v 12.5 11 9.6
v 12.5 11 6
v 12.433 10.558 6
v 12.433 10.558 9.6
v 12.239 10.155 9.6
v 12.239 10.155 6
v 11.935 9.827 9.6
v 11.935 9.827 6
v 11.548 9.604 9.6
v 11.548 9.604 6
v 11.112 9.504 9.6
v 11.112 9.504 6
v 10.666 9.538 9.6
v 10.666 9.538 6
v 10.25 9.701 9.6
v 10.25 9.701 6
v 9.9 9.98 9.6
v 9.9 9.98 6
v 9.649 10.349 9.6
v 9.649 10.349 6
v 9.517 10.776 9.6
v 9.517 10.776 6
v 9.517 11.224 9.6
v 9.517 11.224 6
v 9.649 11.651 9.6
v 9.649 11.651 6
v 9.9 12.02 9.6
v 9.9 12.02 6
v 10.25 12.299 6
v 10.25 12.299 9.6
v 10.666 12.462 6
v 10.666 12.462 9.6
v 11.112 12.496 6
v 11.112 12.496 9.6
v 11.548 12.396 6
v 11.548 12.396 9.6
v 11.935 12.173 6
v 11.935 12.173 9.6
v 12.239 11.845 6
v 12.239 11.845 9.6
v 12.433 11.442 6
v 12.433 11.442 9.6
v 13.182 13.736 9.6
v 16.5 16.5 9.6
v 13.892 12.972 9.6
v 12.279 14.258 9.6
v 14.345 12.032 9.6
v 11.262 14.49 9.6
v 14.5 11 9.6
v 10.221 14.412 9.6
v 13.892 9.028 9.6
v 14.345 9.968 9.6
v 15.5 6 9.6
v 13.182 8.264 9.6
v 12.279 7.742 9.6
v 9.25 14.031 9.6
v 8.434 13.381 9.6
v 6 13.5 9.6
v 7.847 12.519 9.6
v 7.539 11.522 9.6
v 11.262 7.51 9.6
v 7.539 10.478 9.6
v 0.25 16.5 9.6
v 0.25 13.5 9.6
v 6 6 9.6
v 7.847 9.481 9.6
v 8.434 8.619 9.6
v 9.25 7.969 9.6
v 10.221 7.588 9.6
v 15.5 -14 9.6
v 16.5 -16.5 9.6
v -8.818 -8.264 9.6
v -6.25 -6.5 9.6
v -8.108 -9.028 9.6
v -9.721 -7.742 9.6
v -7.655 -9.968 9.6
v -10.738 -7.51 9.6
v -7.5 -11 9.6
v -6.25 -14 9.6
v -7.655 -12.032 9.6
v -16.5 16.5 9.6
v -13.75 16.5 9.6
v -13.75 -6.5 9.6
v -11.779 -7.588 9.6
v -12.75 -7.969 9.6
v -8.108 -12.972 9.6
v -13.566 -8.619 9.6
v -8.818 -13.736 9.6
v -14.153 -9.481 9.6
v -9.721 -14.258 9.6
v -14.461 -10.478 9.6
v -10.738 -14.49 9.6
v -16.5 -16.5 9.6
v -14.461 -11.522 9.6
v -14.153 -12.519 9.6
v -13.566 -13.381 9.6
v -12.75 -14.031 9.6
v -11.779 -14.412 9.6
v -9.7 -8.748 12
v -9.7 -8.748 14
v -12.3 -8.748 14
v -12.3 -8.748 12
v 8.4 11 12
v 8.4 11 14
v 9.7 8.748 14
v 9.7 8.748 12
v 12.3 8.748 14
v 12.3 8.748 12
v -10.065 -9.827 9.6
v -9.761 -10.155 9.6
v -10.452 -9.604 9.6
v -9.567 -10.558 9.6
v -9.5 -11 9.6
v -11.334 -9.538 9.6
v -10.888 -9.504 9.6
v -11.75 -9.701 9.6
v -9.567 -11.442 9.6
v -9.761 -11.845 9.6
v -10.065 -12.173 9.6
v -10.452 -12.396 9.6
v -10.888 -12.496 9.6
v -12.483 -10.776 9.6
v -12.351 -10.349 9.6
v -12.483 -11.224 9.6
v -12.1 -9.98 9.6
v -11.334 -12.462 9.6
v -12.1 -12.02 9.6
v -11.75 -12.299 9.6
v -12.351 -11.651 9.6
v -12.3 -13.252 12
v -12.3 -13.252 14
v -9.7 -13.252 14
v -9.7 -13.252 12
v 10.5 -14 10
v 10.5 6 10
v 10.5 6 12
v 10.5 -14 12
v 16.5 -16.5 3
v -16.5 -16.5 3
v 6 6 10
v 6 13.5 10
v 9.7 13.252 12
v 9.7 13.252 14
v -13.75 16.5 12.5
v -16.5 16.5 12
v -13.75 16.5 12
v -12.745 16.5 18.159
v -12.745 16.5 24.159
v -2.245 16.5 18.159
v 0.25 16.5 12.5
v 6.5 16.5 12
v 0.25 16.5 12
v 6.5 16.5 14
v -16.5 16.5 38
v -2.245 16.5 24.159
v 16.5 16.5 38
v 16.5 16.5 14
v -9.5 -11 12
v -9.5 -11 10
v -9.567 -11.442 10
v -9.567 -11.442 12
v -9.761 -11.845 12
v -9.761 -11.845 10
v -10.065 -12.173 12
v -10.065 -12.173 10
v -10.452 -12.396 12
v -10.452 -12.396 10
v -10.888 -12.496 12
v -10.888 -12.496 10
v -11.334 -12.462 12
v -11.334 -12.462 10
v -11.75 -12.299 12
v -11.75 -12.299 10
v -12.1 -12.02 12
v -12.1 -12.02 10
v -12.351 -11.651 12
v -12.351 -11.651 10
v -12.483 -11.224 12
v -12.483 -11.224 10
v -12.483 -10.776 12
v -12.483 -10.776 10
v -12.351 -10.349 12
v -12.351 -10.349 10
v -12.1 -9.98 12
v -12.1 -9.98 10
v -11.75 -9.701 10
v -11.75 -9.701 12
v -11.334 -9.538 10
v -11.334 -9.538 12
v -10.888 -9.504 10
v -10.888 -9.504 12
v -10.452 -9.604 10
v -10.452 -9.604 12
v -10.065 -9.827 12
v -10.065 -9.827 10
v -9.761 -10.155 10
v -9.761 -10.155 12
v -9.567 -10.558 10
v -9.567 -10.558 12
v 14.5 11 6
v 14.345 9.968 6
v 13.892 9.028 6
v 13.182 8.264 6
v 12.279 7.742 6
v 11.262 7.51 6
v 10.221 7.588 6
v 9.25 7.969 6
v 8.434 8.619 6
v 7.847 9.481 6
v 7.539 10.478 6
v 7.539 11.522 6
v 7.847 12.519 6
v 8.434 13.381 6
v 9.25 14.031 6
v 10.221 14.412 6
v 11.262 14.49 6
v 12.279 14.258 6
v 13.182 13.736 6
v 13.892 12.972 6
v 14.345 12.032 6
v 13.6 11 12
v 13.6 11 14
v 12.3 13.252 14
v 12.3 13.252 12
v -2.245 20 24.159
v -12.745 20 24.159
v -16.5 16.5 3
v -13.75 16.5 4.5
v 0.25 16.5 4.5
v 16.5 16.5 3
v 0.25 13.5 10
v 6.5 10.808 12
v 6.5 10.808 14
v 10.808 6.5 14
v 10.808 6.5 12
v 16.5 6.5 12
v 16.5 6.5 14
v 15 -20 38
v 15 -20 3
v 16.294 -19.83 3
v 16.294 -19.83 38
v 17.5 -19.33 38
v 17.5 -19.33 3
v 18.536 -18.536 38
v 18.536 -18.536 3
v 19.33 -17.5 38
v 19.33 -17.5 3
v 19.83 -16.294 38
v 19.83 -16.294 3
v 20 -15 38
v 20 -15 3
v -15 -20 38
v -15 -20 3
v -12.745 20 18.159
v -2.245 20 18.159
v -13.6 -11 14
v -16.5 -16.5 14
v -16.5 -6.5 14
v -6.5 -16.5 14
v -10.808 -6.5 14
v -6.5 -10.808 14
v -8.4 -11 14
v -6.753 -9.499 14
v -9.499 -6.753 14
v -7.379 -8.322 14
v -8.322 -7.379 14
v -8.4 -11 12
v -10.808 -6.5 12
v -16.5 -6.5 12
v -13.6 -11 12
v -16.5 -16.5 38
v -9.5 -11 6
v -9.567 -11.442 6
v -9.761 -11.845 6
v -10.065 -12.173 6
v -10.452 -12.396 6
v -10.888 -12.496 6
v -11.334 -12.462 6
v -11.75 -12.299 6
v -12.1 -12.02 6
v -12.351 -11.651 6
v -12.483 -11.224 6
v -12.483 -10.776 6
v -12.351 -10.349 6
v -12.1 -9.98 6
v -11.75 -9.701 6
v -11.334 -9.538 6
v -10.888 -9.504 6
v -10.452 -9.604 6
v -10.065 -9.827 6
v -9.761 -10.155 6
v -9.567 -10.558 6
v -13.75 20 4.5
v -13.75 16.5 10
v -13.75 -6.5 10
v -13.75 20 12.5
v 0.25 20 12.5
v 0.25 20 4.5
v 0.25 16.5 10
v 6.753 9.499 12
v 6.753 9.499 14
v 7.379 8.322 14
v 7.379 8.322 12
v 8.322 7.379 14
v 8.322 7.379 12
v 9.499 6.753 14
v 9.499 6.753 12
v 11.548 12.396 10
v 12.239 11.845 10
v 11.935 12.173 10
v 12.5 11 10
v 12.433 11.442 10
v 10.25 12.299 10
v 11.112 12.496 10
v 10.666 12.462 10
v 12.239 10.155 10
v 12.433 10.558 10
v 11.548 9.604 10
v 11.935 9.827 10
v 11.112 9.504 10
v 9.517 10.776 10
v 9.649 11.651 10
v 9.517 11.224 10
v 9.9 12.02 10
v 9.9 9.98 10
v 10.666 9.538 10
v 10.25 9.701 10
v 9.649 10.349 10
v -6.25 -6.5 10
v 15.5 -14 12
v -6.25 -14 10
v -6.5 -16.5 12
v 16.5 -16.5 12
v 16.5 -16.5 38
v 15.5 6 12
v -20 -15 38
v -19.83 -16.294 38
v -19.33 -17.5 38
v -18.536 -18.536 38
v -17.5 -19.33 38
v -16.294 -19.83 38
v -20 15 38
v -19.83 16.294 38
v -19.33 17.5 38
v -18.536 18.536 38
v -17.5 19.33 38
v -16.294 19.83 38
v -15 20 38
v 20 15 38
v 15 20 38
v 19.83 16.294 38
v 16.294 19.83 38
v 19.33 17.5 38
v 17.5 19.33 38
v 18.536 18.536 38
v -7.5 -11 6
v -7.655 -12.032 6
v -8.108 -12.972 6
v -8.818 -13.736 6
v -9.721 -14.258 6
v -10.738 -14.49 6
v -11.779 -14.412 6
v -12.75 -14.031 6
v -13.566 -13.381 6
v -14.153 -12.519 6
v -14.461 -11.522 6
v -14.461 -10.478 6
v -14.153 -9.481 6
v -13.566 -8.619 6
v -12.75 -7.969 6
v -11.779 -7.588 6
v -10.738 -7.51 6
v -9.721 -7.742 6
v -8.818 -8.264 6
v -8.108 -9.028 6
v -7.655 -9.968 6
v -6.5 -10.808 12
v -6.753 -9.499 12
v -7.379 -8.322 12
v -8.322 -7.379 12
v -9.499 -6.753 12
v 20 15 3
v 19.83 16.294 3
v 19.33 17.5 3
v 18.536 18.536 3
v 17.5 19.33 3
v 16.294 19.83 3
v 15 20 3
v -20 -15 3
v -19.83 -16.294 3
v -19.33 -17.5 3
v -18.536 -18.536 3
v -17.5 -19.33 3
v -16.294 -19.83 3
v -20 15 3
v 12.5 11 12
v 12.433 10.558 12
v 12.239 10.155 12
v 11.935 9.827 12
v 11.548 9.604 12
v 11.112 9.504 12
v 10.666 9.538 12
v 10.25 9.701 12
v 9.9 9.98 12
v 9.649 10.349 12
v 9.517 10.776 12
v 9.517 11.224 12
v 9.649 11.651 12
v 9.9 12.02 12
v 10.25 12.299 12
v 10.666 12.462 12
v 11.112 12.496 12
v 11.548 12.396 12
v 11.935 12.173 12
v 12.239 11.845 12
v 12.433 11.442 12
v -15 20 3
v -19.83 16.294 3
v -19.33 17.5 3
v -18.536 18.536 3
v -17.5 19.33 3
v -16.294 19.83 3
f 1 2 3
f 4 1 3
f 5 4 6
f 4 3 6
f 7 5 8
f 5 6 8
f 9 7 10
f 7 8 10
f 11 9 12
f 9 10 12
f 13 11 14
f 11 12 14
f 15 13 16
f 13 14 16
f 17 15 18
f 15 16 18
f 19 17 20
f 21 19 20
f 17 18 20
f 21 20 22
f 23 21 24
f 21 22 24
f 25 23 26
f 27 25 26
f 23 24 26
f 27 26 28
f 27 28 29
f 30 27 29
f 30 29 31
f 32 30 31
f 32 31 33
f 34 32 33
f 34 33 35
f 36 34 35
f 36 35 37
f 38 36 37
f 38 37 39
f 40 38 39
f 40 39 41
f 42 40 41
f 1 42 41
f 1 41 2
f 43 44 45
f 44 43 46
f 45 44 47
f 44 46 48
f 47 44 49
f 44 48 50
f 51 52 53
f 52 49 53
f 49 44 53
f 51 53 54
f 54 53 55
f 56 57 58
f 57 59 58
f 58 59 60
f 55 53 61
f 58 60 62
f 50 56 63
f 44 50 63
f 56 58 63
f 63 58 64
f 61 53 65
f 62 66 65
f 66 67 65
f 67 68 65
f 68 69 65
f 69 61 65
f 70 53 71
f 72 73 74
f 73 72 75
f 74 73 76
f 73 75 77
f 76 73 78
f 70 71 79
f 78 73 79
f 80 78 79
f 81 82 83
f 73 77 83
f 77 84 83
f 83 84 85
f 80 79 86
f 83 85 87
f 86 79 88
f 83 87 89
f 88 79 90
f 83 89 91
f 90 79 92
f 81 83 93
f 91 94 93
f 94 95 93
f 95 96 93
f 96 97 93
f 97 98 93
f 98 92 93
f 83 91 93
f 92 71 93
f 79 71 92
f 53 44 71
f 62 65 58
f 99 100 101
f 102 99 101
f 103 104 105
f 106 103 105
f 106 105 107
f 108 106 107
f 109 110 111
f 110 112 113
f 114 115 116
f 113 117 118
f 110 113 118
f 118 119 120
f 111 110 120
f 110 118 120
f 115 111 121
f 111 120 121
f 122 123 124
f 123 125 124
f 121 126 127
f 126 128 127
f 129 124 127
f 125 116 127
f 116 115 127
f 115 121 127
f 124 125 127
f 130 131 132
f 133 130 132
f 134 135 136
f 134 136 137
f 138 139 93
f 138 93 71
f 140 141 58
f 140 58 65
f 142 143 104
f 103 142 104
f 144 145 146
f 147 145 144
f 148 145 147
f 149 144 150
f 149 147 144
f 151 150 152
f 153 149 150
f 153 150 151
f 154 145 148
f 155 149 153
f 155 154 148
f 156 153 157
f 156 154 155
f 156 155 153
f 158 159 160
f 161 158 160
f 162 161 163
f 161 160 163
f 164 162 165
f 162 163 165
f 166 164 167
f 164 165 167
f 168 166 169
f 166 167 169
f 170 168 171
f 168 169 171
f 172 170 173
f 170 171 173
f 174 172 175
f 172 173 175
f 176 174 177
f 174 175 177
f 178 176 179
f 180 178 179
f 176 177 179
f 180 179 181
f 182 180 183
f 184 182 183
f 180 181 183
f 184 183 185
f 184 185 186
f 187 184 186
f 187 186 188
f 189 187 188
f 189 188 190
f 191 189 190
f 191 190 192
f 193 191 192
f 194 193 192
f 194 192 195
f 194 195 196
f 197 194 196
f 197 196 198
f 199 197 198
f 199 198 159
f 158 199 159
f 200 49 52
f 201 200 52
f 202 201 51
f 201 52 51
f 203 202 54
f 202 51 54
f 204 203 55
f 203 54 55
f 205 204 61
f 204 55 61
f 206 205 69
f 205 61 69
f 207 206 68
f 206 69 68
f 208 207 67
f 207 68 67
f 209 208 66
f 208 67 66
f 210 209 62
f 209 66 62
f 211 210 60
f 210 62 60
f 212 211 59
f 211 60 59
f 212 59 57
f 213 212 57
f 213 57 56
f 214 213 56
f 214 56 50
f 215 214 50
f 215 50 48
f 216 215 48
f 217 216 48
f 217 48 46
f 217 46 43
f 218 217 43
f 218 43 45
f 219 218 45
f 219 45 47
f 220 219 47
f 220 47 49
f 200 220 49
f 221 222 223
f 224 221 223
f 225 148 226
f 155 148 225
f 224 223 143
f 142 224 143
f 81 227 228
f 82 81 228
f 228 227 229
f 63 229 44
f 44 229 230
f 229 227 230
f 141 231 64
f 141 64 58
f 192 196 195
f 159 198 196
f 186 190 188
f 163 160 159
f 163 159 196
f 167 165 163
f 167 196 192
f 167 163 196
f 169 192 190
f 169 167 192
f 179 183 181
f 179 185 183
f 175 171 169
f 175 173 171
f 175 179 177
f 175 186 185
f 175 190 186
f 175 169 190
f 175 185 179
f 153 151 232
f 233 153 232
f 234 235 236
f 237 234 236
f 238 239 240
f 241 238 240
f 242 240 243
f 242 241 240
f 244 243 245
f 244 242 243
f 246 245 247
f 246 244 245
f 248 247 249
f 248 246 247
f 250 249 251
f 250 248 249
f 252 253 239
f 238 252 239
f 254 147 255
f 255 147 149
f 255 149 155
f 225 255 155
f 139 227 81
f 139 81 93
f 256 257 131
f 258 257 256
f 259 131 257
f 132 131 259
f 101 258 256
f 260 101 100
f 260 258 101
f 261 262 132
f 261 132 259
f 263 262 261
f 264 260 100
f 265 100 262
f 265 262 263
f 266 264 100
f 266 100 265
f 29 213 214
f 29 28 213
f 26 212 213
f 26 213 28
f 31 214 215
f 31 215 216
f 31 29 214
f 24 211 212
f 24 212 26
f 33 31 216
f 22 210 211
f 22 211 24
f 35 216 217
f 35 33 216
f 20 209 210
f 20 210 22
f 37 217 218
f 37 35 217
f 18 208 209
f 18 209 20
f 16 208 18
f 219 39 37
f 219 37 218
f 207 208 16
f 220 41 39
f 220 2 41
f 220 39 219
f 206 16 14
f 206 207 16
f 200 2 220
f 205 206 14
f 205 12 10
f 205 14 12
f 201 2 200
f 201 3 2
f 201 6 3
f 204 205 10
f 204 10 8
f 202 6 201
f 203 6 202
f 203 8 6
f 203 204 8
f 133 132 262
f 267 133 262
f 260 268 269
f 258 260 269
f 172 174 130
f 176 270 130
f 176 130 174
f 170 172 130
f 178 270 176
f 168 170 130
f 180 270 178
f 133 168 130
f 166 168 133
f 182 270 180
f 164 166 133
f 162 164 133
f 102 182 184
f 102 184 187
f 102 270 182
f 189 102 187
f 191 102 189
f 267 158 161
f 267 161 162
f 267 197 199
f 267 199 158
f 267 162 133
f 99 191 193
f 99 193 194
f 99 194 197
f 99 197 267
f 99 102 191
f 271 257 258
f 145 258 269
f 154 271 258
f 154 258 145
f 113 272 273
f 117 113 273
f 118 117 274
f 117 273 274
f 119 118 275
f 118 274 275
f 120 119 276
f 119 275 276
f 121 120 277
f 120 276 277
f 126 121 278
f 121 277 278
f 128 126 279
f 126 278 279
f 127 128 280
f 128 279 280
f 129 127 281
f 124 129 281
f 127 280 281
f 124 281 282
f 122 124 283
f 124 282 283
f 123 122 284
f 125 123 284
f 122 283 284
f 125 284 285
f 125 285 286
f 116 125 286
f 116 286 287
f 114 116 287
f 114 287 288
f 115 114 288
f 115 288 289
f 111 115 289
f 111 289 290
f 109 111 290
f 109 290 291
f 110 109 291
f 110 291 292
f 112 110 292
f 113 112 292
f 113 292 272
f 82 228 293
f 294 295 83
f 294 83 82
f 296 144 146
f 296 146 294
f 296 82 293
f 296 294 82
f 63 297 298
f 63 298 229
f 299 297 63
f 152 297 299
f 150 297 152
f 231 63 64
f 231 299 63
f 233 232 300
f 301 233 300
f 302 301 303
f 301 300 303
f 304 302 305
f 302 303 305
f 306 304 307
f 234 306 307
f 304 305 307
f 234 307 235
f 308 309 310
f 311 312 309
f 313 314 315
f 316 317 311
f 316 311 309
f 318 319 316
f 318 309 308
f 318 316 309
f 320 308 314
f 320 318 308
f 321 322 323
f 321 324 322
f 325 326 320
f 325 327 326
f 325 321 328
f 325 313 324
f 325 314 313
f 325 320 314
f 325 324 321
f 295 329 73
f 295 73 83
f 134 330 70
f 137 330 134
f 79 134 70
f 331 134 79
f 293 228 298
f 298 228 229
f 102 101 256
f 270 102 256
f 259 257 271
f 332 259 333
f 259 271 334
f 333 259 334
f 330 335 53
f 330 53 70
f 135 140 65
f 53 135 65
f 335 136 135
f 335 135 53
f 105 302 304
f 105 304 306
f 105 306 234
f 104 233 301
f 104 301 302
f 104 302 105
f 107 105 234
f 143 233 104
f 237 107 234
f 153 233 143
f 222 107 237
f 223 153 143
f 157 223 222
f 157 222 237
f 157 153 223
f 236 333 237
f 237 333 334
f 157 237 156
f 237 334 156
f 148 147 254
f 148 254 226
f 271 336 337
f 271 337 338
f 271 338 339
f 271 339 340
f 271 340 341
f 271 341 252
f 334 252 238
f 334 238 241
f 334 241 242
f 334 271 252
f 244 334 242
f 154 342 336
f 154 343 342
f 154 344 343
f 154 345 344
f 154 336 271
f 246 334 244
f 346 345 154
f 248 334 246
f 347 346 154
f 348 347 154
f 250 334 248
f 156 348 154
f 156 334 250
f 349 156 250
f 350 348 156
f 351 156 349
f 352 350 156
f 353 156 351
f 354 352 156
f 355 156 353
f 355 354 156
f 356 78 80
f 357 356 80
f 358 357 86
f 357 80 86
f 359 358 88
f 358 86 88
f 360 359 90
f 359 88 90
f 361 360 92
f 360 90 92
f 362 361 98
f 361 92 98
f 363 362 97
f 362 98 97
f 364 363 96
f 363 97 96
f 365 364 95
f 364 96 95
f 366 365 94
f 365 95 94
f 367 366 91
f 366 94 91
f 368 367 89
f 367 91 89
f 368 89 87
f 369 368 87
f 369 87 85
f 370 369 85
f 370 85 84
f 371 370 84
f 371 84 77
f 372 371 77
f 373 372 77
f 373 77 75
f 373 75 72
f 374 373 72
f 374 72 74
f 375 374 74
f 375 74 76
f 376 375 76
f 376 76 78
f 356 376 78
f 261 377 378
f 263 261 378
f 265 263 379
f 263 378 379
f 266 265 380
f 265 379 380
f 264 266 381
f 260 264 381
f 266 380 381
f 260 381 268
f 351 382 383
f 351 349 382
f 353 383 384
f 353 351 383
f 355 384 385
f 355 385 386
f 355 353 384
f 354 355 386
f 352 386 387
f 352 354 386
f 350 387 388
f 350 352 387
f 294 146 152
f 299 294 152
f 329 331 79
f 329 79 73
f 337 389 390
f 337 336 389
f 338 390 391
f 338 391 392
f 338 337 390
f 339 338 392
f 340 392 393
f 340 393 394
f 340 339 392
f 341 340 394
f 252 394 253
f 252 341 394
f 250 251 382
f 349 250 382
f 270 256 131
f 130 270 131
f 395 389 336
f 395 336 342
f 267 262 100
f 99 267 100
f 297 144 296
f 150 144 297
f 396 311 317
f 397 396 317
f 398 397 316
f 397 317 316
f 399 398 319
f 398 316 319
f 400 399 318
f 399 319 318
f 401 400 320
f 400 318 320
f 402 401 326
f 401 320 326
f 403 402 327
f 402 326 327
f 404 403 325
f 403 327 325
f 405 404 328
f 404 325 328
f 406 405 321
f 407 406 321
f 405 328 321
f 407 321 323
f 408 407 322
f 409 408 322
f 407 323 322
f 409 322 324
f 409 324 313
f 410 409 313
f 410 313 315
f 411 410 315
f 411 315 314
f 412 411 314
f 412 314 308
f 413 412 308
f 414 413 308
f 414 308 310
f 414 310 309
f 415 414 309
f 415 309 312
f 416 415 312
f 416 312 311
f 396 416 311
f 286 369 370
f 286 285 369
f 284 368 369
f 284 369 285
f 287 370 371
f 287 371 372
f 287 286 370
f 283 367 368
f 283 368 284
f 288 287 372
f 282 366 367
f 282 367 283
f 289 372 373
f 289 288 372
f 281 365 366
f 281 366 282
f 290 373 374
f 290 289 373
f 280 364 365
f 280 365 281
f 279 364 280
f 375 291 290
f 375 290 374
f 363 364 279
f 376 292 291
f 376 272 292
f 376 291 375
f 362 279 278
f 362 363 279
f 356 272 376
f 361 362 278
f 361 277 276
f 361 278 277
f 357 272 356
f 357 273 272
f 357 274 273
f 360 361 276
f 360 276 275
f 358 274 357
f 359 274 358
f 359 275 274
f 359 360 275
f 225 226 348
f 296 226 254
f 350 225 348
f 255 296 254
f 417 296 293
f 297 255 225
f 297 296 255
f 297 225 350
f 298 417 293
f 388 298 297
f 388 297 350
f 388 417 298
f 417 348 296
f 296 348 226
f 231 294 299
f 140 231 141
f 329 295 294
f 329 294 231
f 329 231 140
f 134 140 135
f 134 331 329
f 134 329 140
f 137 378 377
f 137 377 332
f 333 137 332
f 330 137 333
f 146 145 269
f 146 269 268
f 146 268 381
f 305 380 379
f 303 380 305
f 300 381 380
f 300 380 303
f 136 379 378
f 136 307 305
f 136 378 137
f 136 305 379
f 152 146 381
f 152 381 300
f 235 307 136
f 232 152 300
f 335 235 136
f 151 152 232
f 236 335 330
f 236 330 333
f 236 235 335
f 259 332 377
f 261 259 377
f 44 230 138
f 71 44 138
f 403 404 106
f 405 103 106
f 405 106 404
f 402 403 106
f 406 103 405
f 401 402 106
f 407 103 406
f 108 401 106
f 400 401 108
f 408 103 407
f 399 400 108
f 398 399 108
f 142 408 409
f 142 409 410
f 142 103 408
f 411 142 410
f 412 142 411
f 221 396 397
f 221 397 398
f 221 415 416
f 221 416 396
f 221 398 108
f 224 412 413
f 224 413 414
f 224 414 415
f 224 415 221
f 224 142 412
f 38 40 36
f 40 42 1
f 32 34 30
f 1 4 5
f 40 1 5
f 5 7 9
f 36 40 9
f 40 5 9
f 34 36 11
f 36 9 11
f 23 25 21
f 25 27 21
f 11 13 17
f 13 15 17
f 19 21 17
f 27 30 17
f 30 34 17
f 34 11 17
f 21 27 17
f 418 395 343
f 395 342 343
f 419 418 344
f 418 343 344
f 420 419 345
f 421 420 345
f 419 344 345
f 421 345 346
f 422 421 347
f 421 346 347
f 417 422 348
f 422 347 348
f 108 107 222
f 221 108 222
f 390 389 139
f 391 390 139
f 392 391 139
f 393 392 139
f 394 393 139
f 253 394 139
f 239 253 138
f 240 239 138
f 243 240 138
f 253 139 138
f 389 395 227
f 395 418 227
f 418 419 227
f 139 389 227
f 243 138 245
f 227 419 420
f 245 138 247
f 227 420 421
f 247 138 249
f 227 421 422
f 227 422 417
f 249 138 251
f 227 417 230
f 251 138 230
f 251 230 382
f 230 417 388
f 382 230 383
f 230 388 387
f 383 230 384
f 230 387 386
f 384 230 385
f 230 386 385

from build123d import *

# Parameters (mm, degrees)
SKETCH004_W     = 40
SKETCH004_H     = 40
PAD001_DEPTH    = 35
FILLET001_R     = 5
SKETCH005_W     = 33
SKETCH005_H     = 33
POCKET003_DEPTH = 7
SKETCH006_W     = 5
SKETCH006_H     = 20
POCKET004_DEPTH = 2
SKETCH007_R     = 3.5
PAD002_DEPTH    = 4
SKETCH009_W     = 33
SKETCH009_H     = 33
POCKET006_DEPTH = 31
SKETCH010_W     = 14
SKETCH010_H     = 8
POCKET007_DEPTH = 4
SKETCH011_W     = 10.5
SKETCH011_H     = 6
POCKET008_DEPTH = 4
PAD003_DEPTH    = 2
SKETCH013_R     = 1.5
POCKET009_DEPTH = 8
POCKET010_DEPTH = 2
PAD004_DEPTH    = 0.4


with BuildPart() as part:
    # Sketch004 → Pad001 (new body)
    with BuildSketch(Plane.XY):
        Rectangle(SKETCH004_W, SKETCH004_H)
    extrude(amount=PAD001_DEPTH)

    # Fillet001
    fillet001_edges = [part.edges().sort_by_distance(p)[0] for p in [
        (-20, -20, 17.5),
        (20, -20, 17.5),
        (20, 20, 17.5),
        (-20, 20, 17.5),
    ]]
    fillet(fillet001_edges, radius=FILLET001_R)

    # Sketch005 (on Face2 of Fillet001) → Pocket003 (cut)
    with BuildSketch(Plane(origin=(0, 0, 0), x_dir=(1, 0, 0), z_dir=(0, 0, -1))):
        Rectangle(SKETCH005_W, SKETCH005_H)
    extrude(amount=-POCKET003_DEPTH, mode=Mode.SUBTRACT)

    # Sketch006 (on Face15 of Pocket003) → Pocket004 (cut)
    with BuildSketch(Plane(origin=(0, 0, 7), x_dir=(1, 0, 0), z_dir=(0, 0, -1))):
        with Locations((13, 4)):
            Rectangle(SKETCH006_W, SKETCH006_H)
    extrude(amount=-POCKET004_DEPTH, mode=Mode.SUBTRACT)

    # Sketch007 (on Face15 of Pocket004) → Pad002 (join)
    with BuildSketch(Plane(origin=(0, 0, 7), x_dir=(1, 0, 0), z_dir=(0, 0, -1))):
        with Locations((-11, 11)):
            Circle(SKETCH007_R)
        with Locations((11, -11)):
            Circle(SKETCH007_R)
    extrude(amount=PAD002_DEPTH)

    # Sketch009 → Pocket006 (cut)
    with BuildSketch(Plane.XY.offset(40)):
        Rectangle(SKETCH009_W, SKETCH009_H)
    extrude(amount=-POCKET006_DEPTH, mode=Mode.SUBTRACT)

    # Sketch010 (on Face14 of Pocket006) → Pocket007 (cut)
    with BuildSketch(Plane.XZ.offset(-16.5)):
        with Locations((-6.75, 5.5)):
            Rectangle(SKETCH010_W, SKETCH010_H)
    extrude(amount=-POCKET007_DEPTH, mode=Mode.SUBTRACT)

    # Sketch011 (on Face17 of Pocket007) → Pocket008 (cut)
    with BuildSketch(Plane.XZ.offset(-16.5)):
        with Locations((-7.49469, 18.159044)):
            Rectangle(SKETCH011_W, SKETCH011_H)
    extrude(amount=-POCKET008_DEPTH, mode=Mode.SUBTRACT)

    # Sketch012 (on Face28 of Pocket008) → Pad003 (join)
    with BuildSketch(Plane.XY.offset(9)):
        with BuildLine():
            Line((16.5, 16.5), (6.5, 16.5))
            Line((6.5, 16.5), (6.5, 10.808341))
            ThreePointArc((6.5, 10.808341), (7.815135, 7.815135), (10.808341, 6.5))
            Line((10.808341, 6.5), (16.5, 6.5))
            Line((16.5, 6.5), (16.5, 16.5))
        make_face()
        with BuildLine():
            Line((-16.5, -16.5), (-6.5, -16.5))
            Line((-6.5, -16.5), (-6.5, -10.808341))
            ThreePointArc((-6.5, -10.808341), (-7.815135, -7.815135), (-10.808341, -6.5))
            Line((-10.808341, -6.5), (-16.5, -6.5))
            Line((-16.5, -6.5), (-16.5, -16.5))
        make_face()
    extrude(amount=PAD003_DEPTH)

    # Sketch013 (on Face45 of Pad003) → Pocket009 (cut)
    with BuildSketch(Plane(origin=(0, 0, 3), x_dir=(1, 0, 0), z_dir=(0, 0, -1))):
        with Locations((-11, 11)):
            Circle(SKETCH013_R)
        with Locations((11, -11)):
            Circle(SKETCH013_R)
    extrude(amount=-POCKET009_DEPTH, mode=Mode.SUBTRACT)

    # Sketch014 (on Face30 of Pocket009) → Pocket010 (cut)
    with BuildSketch(Plane.XY.offset(11)):
        Polygon((13.6, 11), (12.3, 13.251666), (9.7, 13.251666), (8.4, 11), (9.7, 8.748334), (12.3, 8.748334), align=None)
        Polygon((-8.4, -11), (-9.7, -8.748334), (-12.3, -8.748334), (-13.6, -11), (-12.3, -13.251666), (-9.7, -13.251666), align=None)
    extrude(amount=-POCKET010_DEPTH, mode=Mode.SUBTRACT)

    # Sketch015 (on Face27 of Pocket010) → Pad004 (join)
    with BuildSketch(Plane(origin=(0, 0, 7), x_dir=(1, 0, 0), z_dir=(0, 0, -1))):
        Polygon((-16.5, 16.5), (16.5, 16.5), (16.5, -16.5), (0.25, -16.5), (0.25, -13.5), (6, -13.5), (6, -6), (15.5, -6), (15.5, 14), (-6.25, 14), (-6.25, 6.5), (-13.75, 6.5), (-13.75, -16.5), (-16.5, -16.5), align=None)
    extrude(amount=PAD004_DEPTH)


with BuildPart() as part_1:
    # Body001 placement: moved
    add(part.part.moved(Location((0, 0, 3))))


solid = part_1.part
